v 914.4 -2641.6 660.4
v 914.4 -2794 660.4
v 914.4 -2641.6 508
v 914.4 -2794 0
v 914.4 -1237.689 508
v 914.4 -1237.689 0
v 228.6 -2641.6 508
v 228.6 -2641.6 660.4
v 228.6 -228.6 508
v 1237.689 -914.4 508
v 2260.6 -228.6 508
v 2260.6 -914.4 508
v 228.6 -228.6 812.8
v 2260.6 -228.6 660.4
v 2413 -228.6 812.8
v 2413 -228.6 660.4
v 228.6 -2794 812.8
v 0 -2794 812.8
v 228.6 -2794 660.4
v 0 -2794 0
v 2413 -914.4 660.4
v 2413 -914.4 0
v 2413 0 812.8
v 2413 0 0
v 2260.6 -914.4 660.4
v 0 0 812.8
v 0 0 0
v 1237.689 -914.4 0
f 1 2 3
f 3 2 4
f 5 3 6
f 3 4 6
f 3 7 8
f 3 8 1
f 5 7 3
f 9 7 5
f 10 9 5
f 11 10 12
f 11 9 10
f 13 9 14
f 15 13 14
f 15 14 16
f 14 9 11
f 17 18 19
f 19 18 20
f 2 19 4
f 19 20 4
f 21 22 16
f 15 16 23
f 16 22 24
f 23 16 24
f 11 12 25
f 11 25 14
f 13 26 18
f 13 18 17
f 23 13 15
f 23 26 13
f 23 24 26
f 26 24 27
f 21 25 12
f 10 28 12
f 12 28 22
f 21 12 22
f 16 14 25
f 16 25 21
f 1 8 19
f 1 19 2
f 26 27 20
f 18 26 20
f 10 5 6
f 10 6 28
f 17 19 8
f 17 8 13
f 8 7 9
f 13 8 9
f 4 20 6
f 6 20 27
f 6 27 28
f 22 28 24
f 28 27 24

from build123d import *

# Parameters (mm, degrees)
F1_DEPTH = 508
F3_DEPTH = 304.8
F4_W     = 152.4
F4_H     = 685.8
F4_W_2   = 685.8
F4_H_2   = 152.4
F5_DEPTH = 152.4


with BuildPart() as f1:
    # F0 (on Top) → F1 (new body)
    with BuildSketch(Plane.XY):
        Polygon((2413, 0), (0, 0), (0, -2794), (914.4, -2794), (914.4, -1237.68922), (1237.68922, -914.4), (2413, -914.4), align=None)
    extrude(amount=F1_DEPTH)

    # F2 (on face) → F3 (join)
    with BuildSketch(Plane.XY.offset(508)):
        Polygon((0, 0), (0, -2794), (228.6, -2794), (228.6, -228.6), (2413, -228.6), (2413, 0), align=None)
    extrude(amount=F3_DEPTH)

    # F4 (on face) → F5 (join)
    with BuildSketch(Plane.XY.offset(508)):
        with Locations((2336.8, -571.5)):
            Rectangle(F4_W, F4_H)
        with Locations((571.5, -2717.8)):
            Rectangle(F4_W_2, F4_H_2)
    extrude(amount=F5_DEPTH)


solid = f1.part
